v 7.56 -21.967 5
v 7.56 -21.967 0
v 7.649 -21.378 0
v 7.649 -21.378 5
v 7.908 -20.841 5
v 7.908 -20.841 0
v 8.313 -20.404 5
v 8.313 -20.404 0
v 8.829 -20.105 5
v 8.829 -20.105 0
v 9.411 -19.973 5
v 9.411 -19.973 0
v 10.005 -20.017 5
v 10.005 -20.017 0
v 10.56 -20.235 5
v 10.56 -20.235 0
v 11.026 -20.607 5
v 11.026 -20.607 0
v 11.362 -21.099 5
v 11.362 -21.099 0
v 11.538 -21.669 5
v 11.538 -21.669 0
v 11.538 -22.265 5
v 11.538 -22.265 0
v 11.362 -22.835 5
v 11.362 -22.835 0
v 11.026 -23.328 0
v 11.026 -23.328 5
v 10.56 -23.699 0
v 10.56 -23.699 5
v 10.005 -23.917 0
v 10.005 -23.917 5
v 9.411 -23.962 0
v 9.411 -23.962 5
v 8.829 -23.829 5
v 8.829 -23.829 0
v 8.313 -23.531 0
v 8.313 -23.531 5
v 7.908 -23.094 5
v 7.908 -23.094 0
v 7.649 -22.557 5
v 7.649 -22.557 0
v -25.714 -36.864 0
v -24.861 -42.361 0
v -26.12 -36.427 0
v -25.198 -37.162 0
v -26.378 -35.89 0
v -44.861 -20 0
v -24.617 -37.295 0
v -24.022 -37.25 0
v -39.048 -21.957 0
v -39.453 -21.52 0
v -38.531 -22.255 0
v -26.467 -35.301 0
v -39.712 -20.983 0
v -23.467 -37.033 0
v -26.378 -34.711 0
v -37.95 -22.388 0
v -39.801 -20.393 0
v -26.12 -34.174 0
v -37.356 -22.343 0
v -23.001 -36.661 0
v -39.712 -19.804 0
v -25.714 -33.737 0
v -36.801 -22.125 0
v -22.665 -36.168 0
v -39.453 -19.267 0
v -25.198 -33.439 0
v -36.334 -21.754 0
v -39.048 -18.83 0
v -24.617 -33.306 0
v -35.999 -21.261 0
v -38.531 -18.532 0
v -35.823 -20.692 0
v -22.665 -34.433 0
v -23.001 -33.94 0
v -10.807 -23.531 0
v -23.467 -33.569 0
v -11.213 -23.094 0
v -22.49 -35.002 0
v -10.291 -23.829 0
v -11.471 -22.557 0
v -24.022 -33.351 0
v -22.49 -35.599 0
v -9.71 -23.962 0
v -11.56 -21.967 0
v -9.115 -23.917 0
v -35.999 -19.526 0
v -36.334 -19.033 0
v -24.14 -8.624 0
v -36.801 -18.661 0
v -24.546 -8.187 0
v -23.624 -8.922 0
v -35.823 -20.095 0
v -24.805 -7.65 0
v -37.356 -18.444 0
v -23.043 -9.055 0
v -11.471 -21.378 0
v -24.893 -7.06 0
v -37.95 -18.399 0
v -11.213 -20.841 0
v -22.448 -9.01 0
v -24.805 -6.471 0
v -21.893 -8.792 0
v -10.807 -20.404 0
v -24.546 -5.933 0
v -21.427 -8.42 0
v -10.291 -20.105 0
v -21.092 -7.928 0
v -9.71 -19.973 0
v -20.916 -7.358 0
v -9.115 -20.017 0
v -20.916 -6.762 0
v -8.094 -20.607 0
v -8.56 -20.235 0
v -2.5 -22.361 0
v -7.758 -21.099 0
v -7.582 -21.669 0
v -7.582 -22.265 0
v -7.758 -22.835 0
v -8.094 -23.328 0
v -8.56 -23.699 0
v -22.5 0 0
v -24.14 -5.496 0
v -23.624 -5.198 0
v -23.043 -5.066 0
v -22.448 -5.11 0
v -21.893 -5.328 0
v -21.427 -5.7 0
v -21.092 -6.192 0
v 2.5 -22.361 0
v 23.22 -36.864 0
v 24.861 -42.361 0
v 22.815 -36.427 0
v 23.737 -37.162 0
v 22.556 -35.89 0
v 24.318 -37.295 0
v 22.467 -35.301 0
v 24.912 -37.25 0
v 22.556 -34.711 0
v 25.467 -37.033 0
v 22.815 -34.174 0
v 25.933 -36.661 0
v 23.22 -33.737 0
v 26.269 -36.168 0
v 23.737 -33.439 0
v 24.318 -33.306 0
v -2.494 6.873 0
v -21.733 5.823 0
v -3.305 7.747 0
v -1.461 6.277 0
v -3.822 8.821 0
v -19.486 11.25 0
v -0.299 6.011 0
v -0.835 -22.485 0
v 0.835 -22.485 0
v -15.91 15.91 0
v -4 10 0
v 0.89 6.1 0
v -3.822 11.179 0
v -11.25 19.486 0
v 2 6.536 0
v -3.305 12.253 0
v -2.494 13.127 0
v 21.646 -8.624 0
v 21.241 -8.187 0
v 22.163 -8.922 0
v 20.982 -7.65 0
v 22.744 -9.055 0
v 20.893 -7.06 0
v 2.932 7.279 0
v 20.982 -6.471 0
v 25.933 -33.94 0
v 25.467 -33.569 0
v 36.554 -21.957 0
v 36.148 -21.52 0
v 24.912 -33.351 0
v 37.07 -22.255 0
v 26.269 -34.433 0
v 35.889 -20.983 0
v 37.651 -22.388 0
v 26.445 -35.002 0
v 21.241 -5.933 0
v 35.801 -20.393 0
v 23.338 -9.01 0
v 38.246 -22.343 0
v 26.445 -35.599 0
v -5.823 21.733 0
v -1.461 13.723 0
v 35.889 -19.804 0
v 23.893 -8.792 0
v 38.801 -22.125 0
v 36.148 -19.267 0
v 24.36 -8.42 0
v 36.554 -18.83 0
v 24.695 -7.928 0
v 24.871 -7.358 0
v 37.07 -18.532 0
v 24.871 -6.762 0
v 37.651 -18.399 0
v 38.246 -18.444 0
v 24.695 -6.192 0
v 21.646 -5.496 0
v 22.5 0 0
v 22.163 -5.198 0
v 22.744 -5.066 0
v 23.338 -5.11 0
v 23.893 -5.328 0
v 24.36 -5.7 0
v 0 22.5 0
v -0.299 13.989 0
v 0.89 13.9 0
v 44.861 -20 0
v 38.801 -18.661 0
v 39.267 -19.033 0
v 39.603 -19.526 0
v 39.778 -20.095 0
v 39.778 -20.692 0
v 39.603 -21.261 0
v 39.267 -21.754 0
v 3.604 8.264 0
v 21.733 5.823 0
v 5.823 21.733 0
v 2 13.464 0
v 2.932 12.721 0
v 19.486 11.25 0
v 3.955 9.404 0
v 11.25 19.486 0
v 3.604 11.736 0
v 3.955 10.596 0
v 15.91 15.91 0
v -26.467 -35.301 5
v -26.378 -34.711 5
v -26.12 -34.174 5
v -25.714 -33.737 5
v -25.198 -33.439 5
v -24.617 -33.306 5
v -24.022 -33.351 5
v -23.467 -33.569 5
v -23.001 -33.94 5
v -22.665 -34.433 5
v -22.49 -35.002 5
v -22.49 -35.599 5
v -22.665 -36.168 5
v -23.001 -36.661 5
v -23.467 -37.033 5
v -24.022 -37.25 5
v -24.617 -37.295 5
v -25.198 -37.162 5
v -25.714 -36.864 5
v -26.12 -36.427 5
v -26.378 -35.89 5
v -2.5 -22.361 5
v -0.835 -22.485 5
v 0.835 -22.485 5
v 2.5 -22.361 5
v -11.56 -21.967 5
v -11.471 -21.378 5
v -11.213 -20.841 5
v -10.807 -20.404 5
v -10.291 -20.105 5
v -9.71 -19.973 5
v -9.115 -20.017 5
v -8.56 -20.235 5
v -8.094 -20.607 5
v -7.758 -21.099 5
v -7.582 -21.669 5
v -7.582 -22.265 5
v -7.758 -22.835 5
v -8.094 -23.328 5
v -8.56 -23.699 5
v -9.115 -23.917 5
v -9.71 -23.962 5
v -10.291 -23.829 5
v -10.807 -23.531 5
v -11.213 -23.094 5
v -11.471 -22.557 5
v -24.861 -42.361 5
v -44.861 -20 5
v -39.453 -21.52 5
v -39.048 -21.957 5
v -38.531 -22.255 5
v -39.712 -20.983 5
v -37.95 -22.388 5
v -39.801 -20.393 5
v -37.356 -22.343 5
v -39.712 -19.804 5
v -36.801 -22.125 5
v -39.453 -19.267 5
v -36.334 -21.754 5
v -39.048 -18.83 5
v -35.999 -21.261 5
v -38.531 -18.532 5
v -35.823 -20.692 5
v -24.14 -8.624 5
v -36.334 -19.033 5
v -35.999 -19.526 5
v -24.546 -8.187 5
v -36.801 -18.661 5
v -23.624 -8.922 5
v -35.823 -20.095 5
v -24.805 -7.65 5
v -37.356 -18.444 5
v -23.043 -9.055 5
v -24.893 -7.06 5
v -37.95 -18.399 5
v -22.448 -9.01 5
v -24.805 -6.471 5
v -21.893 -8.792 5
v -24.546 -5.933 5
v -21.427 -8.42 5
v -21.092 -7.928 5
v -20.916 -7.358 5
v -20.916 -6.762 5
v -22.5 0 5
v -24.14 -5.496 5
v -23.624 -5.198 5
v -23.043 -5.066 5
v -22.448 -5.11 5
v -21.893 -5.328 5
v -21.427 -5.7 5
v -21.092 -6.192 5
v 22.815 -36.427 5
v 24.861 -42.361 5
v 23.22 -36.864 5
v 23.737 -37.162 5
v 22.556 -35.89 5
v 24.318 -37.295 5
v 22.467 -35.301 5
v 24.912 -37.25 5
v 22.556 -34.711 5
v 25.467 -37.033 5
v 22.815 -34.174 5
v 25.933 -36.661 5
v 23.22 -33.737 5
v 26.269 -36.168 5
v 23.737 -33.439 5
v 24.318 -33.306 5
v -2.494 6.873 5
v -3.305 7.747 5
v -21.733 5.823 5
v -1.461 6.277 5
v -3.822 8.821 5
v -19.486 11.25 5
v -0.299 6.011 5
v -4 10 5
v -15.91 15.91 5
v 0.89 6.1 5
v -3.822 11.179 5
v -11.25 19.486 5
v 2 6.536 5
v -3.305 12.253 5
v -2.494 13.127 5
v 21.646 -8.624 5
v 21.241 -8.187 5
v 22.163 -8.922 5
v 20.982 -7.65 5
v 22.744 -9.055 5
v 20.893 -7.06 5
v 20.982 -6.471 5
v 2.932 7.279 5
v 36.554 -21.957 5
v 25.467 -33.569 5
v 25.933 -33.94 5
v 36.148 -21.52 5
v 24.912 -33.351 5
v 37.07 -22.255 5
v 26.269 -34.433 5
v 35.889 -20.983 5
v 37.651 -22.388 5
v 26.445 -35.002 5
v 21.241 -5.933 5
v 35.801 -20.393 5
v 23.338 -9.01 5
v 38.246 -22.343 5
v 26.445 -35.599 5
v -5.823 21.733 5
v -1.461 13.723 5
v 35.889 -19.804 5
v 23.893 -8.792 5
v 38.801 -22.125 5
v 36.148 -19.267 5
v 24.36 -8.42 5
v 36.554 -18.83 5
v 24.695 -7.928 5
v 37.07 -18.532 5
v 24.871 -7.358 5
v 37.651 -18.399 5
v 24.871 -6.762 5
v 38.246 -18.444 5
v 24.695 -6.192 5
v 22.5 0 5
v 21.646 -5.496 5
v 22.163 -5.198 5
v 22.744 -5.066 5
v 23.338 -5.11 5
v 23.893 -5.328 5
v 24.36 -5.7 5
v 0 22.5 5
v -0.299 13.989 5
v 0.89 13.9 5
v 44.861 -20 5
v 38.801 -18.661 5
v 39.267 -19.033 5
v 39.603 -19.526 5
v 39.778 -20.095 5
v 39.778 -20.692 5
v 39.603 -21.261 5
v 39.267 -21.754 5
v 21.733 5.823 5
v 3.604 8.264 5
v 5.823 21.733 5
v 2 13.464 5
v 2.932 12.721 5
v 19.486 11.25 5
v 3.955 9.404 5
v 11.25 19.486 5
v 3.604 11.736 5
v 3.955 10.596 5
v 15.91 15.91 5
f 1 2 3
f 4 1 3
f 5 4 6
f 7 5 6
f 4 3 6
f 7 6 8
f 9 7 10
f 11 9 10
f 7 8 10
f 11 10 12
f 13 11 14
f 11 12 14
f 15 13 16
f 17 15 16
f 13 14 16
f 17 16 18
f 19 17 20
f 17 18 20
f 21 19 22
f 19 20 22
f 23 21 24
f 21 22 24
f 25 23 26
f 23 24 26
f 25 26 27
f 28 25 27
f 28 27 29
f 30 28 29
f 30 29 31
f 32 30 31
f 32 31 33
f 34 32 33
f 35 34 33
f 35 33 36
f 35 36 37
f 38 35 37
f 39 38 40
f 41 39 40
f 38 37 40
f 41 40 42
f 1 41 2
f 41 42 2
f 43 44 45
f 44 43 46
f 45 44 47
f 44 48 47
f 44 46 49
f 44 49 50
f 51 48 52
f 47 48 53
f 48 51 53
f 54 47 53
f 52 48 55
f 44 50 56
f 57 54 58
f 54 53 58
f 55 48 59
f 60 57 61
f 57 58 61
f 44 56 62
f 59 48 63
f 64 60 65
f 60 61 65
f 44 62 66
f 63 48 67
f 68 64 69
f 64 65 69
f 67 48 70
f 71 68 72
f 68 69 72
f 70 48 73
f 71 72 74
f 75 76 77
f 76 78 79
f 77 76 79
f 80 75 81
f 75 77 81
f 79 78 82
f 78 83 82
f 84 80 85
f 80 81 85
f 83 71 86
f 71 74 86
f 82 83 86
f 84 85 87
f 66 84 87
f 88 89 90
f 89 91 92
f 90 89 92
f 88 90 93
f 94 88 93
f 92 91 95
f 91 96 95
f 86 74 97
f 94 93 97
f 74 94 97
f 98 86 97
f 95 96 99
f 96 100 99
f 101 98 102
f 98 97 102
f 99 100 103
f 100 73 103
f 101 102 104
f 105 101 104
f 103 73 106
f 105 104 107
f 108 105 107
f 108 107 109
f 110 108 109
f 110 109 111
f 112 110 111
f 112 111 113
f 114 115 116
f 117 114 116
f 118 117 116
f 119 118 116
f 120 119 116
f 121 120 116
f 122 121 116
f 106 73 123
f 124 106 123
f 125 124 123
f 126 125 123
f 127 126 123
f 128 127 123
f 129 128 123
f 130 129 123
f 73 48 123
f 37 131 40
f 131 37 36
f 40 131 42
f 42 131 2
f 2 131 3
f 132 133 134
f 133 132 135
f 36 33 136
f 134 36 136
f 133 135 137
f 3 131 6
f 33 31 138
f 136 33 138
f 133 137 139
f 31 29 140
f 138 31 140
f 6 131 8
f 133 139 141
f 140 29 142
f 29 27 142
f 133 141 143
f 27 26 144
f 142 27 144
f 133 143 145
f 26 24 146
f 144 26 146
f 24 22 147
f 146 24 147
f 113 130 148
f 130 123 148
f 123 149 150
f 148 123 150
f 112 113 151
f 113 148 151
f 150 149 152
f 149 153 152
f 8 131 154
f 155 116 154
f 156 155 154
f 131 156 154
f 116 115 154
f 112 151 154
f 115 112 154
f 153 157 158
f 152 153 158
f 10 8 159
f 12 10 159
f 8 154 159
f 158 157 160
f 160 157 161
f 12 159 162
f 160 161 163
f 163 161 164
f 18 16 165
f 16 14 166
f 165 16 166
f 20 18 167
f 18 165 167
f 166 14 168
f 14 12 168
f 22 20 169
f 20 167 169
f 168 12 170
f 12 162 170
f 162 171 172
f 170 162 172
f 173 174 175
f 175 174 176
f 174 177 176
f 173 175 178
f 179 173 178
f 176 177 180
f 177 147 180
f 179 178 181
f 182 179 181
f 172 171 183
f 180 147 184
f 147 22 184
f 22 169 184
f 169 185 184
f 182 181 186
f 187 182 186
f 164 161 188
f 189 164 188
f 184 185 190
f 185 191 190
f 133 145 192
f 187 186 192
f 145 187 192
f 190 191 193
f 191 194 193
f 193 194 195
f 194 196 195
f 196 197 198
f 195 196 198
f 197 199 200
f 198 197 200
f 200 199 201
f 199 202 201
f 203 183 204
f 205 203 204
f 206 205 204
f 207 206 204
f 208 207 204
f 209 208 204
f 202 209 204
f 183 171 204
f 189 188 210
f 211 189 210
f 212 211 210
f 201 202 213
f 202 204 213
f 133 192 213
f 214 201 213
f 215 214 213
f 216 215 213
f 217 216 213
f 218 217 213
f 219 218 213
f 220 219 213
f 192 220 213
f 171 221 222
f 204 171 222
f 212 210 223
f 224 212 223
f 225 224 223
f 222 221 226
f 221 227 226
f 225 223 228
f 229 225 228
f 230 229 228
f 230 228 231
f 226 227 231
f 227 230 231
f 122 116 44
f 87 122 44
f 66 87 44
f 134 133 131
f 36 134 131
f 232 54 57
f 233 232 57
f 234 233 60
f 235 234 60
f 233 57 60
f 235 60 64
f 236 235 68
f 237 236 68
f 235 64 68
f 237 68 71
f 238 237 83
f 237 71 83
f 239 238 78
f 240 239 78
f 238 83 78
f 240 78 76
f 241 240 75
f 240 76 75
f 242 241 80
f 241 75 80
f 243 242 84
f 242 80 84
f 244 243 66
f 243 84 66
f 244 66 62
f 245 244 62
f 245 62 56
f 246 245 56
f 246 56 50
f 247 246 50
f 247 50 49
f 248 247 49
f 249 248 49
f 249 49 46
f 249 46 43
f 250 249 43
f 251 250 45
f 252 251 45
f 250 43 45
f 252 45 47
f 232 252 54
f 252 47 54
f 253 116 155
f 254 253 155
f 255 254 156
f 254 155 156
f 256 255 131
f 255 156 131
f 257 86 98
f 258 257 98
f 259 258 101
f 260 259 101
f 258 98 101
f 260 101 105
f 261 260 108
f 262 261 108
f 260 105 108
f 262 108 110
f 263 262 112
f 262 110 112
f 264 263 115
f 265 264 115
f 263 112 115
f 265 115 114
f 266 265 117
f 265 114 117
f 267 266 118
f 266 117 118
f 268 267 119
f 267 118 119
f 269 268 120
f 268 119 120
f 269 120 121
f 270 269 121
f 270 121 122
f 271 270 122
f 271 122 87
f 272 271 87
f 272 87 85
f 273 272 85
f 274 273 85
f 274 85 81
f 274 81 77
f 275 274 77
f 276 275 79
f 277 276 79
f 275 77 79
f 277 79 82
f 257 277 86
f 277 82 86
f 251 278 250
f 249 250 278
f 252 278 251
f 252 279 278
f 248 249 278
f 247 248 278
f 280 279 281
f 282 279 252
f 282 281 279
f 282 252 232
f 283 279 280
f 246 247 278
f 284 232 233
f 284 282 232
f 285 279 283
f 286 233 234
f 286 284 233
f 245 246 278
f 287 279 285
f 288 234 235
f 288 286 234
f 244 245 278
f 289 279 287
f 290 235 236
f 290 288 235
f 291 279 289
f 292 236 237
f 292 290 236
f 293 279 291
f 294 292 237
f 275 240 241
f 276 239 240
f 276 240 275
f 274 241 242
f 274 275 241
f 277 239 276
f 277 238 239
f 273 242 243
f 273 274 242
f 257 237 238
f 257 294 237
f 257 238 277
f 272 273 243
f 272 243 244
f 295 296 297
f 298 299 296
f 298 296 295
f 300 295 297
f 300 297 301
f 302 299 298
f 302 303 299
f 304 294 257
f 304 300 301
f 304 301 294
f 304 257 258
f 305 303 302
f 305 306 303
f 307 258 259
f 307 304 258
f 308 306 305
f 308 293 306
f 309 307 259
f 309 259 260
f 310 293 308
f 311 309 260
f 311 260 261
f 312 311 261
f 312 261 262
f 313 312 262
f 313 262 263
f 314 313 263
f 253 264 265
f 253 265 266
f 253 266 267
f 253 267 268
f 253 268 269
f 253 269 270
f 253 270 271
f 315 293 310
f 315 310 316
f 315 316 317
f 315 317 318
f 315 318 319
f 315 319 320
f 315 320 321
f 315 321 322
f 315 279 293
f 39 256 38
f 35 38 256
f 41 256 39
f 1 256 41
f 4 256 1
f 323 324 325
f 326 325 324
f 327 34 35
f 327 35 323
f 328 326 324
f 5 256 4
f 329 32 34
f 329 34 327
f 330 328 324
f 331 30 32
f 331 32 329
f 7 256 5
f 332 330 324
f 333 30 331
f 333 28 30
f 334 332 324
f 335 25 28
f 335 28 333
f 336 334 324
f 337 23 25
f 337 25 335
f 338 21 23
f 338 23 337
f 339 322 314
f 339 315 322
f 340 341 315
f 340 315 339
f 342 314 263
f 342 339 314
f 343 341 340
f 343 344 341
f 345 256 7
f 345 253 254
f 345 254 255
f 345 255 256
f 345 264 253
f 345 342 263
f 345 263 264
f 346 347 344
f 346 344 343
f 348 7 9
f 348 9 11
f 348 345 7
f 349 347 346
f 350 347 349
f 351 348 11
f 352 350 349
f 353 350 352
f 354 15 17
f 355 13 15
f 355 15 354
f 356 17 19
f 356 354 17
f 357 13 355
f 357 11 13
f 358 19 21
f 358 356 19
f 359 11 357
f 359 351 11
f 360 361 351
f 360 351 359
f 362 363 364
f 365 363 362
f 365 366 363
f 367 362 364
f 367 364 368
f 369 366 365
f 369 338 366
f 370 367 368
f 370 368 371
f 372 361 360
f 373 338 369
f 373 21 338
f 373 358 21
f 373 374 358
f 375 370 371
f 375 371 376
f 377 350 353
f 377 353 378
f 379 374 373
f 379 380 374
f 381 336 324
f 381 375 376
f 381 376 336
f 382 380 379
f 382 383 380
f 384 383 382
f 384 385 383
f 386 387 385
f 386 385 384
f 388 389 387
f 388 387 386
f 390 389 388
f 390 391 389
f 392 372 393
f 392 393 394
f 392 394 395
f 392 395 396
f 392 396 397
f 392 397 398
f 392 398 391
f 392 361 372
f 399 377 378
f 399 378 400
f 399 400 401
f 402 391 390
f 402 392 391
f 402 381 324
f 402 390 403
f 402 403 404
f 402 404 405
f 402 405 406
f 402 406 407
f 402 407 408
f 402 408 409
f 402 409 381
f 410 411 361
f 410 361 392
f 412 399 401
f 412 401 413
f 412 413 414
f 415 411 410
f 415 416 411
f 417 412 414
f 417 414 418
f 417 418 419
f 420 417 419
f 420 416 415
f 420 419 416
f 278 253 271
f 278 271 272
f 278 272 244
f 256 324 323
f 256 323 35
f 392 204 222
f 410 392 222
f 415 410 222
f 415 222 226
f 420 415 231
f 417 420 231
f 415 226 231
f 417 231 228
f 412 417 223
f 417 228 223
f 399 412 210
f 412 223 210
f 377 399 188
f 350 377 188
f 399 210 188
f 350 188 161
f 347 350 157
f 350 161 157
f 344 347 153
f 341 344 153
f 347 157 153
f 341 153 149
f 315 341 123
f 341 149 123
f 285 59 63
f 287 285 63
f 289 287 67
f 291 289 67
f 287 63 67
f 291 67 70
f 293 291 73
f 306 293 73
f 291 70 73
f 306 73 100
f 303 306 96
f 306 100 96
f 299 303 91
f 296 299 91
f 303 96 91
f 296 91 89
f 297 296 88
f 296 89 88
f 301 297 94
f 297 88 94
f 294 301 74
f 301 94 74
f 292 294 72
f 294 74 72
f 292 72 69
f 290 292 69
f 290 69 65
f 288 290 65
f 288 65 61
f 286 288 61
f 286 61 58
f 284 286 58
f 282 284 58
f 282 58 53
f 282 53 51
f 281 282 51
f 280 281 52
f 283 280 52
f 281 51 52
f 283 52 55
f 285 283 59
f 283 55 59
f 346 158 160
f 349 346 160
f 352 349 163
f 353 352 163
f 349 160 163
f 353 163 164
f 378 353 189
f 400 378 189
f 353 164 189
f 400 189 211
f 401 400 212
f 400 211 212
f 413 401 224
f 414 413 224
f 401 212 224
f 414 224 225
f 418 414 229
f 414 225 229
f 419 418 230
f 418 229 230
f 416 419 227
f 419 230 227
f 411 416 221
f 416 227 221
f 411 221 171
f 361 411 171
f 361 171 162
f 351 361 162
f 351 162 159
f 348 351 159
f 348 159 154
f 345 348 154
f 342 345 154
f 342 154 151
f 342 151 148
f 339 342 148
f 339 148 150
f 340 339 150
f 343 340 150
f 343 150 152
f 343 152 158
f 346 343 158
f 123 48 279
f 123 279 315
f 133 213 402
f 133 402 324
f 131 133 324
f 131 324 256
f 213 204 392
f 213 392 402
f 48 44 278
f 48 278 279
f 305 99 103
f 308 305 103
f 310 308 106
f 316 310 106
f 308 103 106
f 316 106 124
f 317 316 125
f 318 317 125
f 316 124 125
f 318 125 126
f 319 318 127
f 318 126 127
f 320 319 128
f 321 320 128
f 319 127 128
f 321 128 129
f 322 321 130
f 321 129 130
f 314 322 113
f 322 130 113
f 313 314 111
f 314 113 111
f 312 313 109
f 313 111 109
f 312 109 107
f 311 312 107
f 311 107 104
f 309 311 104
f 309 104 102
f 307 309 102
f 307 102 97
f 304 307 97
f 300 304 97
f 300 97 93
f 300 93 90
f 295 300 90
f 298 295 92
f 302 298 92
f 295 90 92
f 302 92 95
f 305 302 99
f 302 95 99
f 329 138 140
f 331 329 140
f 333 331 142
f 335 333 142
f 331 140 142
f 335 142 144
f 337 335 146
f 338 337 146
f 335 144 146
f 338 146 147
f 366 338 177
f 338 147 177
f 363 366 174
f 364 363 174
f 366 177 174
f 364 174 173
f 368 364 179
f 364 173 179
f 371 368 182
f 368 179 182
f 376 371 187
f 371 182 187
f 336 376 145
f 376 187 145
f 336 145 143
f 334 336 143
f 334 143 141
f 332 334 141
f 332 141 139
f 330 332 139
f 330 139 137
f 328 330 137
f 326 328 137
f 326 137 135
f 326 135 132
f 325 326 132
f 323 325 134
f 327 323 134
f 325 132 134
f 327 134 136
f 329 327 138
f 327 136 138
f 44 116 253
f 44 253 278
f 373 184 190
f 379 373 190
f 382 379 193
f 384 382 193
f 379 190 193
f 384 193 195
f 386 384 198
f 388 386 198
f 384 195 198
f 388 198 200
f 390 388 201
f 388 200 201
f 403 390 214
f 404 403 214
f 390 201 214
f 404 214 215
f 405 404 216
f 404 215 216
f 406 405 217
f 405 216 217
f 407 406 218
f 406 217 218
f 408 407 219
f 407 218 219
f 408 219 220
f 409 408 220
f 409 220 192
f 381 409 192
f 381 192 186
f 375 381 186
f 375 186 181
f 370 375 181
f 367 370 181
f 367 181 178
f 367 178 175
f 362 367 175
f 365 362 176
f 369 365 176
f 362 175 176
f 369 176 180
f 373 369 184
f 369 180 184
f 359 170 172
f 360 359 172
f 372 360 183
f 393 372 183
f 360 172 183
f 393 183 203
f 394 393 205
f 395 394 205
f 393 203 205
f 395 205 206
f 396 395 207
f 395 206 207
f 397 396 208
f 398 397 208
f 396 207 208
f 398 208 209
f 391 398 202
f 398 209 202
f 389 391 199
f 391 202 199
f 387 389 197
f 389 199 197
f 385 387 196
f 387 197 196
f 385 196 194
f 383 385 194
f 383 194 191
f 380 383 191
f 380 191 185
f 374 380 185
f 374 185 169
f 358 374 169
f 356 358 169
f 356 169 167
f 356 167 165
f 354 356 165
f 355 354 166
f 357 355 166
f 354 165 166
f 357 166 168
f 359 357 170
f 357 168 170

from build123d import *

# Parameters (mm, degrees)
SKETCH2_R           = 22.5
BOSS_EXTRUDE1_DEPTH = 5
SKETCH3_R           = 2
CUT_EXTRUDE1_DEPTH  = 5
SKETCH4_R           = 4
CUT_EXTRUDE2_DEPTH  = 10


with BuildPart() as part:
    # Sketch2 → Boss-Extrude1 (new body)
    with BuildSketch(Plane.XY):
        Circle(SKETCH2_R)
        Polygon((-22.5, 0), (-2.5, -22.360679775), (-24.860679775, -42.360679775), (-44.860679775, -20), align=None)
        Polygon((2.5, -22.360679775), (22.5, 0), (44.860679775, -20), (24.860679775, -42.360679775), align=None)
    extrude(amount=BOSS_EXTRUDE1_DEPTH)

    # Sketch3 → Cut-Extrude1 (cut)
    with BuildSketch(Plane(origin=(0, 0, 0), x_dir=(-1, 0, 0), z_dir=(0, 0, -1))):
        with Locations((-37.800566479, -20.393446629)):
            Circle(SKETCH3_R)
        with Locations((-22.893446629, -7.060113296)):
            Circle(SKETCH3_R)
        with Locations((-9.560113296, -21.967233146)):
            Circle(SKETCH3_R)
        with Locations((-24.467233146, -35.300566479)):
            Circle(SKETCH3_R)
        with Locations((24.467233146, -35.300566479)):
            Circle(SKETCH3_R)
        with Locations((37.800566479, -20.393446629)):
            Circle(SKETCH3_R)
        with Locations((9.560113296, -21.967233146)):
            Circle(SKETCH3_R)
        with Locations((22.893446629, -7.060113296)):
            Circle(SKETCH3_R)
    extrude(amount=-CUT_EXTRUDE1_DEPTH, mode=Mode.SUBTRACT)

    # Sketch4 → Cut-Extrude2 (cut)
    with BuildSketch(Plane(origin=(0, 0, 0), x_dir=(-1, 0, 0), z_dir=(0, 0, -1))):
        with Locations((0, 10)):
            Circle(SKETCH4_R)
    extrude(amount=-CUT_EXTRUDE2_DEPTH, mode=Mode.SUBTRACT)


solid = part.part
